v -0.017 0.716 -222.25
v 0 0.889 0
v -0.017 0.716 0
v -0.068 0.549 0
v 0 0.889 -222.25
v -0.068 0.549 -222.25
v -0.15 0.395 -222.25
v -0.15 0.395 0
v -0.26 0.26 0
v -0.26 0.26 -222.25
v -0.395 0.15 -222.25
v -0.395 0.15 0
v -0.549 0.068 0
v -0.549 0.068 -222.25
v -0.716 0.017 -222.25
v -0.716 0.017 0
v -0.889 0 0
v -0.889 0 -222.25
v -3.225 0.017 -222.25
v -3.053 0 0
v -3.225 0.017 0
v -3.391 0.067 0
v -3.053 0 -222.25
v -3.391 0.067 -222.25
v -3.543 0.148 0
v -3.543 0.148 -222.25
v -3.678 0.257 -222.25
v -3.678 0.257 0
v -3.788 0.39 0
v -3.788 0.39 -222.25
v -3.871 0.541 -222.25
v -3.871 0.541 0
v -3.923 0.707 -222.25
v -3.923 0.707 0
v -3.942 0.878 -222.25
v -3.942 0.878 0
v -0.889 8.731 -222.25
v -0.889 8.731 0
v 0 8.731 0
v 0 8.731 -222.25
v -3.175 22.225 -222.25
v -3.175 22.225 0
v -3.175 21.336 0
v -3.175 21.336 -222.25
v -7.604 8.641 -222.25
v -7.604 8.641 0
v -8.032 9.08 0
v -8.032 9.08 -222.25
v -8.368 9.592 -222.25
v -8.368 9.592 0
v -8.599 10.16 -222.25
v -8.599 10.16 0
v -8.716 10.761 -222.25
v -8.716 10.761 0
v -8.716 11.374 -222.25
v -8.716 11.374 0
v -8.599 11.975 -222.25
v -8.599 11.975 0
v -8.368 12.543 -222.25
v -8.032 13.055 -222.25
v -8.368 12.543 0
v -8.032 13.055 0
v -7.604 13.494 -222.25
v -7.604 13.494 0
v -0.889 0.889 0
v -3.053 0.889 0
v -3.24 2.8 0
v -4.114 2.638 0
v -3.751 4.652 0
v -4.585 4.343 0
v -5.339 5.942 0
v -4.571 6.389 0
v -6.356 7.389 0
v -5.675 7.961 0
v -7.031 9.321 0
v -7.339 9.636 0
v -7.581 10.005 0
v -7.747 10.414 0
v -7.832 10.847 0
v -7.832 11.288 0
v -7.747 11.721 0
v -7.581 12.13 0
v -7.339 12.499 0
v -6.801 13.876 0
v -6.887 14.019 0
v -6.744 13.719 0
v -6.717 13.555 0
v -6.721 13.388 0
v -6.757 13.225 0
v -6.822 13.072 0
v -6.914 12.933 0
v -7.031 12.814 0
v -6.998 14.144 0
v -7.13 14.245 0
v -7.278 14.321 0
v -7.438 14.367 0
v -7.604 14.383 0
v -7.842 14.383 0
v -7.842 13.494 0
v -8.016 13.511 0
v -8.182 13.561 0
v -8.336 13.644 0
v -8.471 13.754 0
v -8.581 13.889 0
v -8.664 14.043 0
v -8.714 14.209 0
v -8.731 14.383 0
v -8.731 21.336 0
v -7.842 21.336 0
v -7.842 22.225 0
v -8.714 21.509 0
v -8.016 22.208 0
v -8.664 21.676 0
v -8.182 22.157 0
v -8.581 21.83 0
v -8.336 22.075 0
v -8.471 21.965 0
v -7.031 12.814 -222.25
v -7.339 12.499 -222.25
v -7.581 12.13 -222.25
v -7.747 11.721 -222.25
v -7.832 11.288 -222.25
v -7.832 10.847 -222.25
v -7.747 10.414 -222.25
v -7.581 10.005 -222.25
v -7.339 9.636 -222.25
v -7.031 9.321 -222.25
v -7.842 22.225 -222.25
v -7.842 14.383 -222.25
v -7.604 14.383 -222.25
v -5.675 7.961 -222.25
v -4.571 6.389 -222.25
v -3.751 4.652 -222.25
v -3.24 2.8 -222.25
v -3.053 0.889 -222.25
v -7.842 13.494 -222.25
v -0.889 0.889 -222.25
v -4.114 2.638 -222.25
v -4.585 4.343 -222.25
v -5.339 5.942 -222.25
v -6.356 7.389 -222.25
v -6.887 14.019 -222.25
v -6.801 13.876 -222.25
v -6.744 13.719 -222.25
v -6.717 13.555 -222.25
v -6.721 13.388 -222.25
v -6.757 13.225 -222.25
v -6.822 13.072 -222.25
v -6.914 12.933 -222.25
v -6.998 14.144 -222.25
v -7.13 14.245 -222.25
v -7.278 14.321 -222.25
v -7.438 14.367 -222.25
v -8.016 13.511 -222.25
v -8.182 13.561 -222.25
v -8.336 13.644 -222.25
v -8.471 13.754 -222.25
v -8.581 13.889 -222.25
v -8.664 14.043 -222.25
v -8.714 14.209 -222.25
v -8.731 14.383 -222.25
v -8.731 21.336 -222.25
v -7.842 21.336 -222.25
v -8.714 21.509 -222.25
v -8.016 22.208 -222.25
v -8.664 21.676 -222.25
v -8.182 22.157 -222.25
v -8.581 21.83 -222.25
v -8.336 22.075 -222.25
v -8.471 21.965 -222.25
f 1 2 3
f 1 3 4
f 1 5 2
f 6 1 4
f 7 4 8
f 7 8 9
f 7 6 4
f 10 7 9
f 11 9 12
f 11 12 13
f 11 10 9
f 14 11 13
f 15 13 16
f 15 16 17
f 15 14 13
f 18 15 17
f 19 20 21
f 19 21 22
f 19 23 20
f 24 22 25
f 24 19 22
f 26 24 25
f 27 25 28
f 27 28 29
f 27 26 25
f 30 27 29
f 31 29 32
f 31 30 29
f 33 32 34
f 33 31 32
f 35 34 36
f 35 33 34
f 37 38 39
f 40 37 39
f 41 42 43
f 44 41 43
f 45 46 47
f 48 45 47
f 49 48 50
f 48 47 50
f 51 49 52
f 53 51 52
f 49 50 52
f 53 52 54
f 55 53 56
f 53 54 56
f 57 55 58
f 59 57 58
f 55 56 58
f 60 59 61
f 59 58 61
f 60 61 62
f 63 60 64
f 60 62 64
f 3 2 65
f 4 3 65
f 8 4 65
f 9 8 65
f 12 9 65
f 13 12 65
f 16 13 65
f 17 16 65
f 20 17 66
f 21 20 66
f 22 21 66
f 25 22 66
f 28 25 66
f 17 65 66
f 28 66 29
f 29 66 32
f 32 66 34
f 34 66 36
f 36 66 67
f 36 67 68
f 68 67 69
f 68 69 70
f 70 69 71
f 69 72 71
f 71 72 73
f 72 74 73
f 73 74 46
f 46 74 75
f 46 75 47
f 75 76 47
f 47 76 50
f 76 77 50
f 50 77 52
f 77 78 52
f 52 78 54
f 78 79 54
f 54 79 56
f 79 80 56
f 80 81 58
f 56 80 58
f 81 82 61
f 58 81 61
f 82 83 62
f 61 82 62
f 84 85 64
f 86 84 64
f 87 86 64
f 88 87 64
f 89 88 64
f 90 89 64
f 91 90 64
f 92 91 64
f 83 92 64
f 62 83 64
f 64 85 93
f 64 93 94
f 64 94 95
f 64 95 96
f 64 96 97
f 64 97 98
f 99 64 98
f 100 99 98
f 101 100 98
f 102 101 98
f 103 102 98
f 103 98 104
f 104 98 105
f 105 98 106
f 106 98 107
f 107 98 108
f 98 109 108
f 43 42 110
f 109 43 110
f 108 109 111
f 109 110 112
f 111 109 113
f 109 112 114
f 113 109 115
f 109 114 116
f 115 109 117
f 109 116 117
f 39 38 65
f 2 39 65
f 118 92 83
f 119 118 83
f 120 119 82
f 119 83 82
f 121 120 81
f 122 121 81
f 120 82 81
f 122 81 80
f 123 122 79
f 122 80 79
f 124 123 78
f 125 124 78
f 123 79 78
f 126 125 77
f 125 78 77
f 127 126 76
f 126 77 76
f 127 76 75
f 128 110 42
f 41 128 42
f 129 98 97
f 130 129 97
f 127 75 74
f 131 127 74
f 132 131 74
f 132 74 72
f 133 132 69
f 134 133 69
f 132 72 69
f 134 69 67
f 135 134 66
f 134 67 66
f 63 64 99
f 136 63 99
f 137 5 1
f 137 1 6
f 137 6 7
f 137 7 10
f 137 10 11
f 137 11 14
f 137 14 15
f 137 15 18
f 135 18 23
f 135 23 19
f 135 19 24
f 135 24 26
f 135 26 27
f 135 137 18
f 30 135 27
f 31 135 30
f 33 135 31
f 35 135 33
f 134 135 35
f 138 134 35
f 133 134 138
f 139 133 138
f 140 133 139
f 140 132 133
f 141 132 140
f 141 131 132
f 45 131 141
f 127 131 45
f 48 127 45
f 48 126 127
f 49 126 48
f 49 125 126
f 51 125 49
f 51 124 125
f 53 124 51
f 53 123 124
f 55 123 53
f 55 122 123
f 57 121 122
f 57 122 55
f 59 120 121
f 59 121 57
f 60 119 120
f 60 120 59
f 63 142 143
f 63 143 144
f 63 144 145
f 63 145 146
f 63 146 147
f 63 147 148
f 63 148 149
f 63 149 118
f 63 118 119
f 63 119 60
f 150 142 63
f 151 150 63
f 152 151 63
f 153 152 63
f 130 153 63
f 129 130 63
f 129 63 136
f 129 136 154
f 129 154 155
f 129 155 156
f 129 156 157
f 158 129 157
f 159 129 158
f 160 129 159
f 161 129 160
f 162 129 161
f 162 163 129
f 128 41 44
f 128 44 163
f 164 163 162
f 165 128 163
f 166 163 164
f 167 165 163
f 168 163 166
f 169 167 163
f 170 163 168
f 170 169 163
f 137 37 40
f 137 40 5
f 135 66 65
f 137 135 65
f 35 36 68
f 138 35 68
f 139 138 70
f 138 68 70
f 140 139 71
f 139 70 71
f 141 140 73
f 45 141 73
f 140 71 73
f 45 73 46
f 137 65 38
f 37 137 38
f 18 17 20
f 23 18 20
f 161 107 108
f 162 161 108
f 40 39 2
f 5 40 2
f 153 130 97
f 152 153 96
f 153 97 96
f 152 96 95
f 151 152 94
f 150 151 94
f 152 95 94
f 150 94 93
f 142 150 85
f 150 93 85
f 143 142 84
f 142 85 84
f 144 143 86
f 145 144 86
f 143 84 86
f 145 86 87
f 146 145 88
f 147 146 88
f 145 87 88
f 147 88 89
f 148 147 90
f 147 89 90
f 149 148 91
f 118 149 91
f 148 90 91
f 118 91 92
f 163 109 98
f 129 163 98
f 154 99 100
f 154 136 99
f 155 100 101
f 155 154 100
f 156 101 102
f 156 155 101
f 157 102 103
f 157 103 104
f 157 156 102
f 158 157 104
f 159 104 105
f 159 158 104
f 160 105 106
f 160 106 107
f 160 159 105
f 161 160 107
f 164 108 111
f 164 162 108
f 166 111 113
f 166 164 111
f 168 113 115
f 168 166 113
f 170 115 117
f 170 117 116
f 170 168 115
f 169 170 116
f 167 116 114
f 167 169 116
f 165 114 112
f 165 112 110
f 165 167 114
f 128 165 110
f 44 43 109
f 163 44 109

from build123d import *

# Parameters (mm, degrees)
BOSS_EXTRUDE1_DEPTH = 222.25
FILLET1_R           = 0.889


with BuildPart() as part:
    # Sketch1 → Boss-Extrude1 (new body)
    with BuildSketch(Plane.XY):
        with BuildLine():
            Line((0, 8.73125), (0, 0))
            Line((0, 0), (-3.96875, 0))
            ThreePointArc((-3.96875, 0), (-4.748467779, 4.757288038), (-7.604139417, 8.641215018))
            ThreePointArc((-7.604139417, 8.641215018), (-8.73125, 11.067482509), (-7.604139417, 13.49375))
            Line((-7.604139417, 13.49375), (-8.73125, 13.49375))
            Line((-8.73125, 13.49375), (-8.73125, 22.225))
            Line((-8.73125, 22.225), (-3.175, 22.225))
            Line((-3.175, 22.225), (-3.175, 21.336))
            Line((-3.175, 21.336), (-7.84225, 21.336))
            Line((-7.84225, 21.336), (-7.84225, 14.38275))
            Line((-7.84225, 14.38275), (-7.604139417, 14.38275))
            ThreePointArc((-7.604139417, 14.38275), (-6.769194058, 13.799015865), (-7.03073038, 12.814395103))
            ThreePointArc((-7.03073038, 12.814395103), (-7.84225, 11.067482509), (-7.03073038, 9.320569916))
            ThreePointArc((-7.03073038, 9.320569916), (-4.123486495, 5.538022334), (-3.052821022, 0.889))
            Line((-3.052821022, 0.889), (-0.889, 0.889))
            Line((-0.889, 0.889), (-0.889, 8.73125))
            Line((-0.889, 8.73125), (0, 8.73125))
        make_face()
    extrude(amount=-BOSS_EXTRUDE1_DEPTH)

    # Fillet1
    fillet1_edges = [part.edges().sort_by_distance(p)[0] for p in [
        (0, 0, -111.125),
        (-3.96875, 0, -111.125),
        (-8.73125, 13.49375, -111.125),
        (-8.73125, 22.225, -111.125),
    ]]
    fillet(fillet1_edges, radius=FILLET1_R)


solid = part.part
